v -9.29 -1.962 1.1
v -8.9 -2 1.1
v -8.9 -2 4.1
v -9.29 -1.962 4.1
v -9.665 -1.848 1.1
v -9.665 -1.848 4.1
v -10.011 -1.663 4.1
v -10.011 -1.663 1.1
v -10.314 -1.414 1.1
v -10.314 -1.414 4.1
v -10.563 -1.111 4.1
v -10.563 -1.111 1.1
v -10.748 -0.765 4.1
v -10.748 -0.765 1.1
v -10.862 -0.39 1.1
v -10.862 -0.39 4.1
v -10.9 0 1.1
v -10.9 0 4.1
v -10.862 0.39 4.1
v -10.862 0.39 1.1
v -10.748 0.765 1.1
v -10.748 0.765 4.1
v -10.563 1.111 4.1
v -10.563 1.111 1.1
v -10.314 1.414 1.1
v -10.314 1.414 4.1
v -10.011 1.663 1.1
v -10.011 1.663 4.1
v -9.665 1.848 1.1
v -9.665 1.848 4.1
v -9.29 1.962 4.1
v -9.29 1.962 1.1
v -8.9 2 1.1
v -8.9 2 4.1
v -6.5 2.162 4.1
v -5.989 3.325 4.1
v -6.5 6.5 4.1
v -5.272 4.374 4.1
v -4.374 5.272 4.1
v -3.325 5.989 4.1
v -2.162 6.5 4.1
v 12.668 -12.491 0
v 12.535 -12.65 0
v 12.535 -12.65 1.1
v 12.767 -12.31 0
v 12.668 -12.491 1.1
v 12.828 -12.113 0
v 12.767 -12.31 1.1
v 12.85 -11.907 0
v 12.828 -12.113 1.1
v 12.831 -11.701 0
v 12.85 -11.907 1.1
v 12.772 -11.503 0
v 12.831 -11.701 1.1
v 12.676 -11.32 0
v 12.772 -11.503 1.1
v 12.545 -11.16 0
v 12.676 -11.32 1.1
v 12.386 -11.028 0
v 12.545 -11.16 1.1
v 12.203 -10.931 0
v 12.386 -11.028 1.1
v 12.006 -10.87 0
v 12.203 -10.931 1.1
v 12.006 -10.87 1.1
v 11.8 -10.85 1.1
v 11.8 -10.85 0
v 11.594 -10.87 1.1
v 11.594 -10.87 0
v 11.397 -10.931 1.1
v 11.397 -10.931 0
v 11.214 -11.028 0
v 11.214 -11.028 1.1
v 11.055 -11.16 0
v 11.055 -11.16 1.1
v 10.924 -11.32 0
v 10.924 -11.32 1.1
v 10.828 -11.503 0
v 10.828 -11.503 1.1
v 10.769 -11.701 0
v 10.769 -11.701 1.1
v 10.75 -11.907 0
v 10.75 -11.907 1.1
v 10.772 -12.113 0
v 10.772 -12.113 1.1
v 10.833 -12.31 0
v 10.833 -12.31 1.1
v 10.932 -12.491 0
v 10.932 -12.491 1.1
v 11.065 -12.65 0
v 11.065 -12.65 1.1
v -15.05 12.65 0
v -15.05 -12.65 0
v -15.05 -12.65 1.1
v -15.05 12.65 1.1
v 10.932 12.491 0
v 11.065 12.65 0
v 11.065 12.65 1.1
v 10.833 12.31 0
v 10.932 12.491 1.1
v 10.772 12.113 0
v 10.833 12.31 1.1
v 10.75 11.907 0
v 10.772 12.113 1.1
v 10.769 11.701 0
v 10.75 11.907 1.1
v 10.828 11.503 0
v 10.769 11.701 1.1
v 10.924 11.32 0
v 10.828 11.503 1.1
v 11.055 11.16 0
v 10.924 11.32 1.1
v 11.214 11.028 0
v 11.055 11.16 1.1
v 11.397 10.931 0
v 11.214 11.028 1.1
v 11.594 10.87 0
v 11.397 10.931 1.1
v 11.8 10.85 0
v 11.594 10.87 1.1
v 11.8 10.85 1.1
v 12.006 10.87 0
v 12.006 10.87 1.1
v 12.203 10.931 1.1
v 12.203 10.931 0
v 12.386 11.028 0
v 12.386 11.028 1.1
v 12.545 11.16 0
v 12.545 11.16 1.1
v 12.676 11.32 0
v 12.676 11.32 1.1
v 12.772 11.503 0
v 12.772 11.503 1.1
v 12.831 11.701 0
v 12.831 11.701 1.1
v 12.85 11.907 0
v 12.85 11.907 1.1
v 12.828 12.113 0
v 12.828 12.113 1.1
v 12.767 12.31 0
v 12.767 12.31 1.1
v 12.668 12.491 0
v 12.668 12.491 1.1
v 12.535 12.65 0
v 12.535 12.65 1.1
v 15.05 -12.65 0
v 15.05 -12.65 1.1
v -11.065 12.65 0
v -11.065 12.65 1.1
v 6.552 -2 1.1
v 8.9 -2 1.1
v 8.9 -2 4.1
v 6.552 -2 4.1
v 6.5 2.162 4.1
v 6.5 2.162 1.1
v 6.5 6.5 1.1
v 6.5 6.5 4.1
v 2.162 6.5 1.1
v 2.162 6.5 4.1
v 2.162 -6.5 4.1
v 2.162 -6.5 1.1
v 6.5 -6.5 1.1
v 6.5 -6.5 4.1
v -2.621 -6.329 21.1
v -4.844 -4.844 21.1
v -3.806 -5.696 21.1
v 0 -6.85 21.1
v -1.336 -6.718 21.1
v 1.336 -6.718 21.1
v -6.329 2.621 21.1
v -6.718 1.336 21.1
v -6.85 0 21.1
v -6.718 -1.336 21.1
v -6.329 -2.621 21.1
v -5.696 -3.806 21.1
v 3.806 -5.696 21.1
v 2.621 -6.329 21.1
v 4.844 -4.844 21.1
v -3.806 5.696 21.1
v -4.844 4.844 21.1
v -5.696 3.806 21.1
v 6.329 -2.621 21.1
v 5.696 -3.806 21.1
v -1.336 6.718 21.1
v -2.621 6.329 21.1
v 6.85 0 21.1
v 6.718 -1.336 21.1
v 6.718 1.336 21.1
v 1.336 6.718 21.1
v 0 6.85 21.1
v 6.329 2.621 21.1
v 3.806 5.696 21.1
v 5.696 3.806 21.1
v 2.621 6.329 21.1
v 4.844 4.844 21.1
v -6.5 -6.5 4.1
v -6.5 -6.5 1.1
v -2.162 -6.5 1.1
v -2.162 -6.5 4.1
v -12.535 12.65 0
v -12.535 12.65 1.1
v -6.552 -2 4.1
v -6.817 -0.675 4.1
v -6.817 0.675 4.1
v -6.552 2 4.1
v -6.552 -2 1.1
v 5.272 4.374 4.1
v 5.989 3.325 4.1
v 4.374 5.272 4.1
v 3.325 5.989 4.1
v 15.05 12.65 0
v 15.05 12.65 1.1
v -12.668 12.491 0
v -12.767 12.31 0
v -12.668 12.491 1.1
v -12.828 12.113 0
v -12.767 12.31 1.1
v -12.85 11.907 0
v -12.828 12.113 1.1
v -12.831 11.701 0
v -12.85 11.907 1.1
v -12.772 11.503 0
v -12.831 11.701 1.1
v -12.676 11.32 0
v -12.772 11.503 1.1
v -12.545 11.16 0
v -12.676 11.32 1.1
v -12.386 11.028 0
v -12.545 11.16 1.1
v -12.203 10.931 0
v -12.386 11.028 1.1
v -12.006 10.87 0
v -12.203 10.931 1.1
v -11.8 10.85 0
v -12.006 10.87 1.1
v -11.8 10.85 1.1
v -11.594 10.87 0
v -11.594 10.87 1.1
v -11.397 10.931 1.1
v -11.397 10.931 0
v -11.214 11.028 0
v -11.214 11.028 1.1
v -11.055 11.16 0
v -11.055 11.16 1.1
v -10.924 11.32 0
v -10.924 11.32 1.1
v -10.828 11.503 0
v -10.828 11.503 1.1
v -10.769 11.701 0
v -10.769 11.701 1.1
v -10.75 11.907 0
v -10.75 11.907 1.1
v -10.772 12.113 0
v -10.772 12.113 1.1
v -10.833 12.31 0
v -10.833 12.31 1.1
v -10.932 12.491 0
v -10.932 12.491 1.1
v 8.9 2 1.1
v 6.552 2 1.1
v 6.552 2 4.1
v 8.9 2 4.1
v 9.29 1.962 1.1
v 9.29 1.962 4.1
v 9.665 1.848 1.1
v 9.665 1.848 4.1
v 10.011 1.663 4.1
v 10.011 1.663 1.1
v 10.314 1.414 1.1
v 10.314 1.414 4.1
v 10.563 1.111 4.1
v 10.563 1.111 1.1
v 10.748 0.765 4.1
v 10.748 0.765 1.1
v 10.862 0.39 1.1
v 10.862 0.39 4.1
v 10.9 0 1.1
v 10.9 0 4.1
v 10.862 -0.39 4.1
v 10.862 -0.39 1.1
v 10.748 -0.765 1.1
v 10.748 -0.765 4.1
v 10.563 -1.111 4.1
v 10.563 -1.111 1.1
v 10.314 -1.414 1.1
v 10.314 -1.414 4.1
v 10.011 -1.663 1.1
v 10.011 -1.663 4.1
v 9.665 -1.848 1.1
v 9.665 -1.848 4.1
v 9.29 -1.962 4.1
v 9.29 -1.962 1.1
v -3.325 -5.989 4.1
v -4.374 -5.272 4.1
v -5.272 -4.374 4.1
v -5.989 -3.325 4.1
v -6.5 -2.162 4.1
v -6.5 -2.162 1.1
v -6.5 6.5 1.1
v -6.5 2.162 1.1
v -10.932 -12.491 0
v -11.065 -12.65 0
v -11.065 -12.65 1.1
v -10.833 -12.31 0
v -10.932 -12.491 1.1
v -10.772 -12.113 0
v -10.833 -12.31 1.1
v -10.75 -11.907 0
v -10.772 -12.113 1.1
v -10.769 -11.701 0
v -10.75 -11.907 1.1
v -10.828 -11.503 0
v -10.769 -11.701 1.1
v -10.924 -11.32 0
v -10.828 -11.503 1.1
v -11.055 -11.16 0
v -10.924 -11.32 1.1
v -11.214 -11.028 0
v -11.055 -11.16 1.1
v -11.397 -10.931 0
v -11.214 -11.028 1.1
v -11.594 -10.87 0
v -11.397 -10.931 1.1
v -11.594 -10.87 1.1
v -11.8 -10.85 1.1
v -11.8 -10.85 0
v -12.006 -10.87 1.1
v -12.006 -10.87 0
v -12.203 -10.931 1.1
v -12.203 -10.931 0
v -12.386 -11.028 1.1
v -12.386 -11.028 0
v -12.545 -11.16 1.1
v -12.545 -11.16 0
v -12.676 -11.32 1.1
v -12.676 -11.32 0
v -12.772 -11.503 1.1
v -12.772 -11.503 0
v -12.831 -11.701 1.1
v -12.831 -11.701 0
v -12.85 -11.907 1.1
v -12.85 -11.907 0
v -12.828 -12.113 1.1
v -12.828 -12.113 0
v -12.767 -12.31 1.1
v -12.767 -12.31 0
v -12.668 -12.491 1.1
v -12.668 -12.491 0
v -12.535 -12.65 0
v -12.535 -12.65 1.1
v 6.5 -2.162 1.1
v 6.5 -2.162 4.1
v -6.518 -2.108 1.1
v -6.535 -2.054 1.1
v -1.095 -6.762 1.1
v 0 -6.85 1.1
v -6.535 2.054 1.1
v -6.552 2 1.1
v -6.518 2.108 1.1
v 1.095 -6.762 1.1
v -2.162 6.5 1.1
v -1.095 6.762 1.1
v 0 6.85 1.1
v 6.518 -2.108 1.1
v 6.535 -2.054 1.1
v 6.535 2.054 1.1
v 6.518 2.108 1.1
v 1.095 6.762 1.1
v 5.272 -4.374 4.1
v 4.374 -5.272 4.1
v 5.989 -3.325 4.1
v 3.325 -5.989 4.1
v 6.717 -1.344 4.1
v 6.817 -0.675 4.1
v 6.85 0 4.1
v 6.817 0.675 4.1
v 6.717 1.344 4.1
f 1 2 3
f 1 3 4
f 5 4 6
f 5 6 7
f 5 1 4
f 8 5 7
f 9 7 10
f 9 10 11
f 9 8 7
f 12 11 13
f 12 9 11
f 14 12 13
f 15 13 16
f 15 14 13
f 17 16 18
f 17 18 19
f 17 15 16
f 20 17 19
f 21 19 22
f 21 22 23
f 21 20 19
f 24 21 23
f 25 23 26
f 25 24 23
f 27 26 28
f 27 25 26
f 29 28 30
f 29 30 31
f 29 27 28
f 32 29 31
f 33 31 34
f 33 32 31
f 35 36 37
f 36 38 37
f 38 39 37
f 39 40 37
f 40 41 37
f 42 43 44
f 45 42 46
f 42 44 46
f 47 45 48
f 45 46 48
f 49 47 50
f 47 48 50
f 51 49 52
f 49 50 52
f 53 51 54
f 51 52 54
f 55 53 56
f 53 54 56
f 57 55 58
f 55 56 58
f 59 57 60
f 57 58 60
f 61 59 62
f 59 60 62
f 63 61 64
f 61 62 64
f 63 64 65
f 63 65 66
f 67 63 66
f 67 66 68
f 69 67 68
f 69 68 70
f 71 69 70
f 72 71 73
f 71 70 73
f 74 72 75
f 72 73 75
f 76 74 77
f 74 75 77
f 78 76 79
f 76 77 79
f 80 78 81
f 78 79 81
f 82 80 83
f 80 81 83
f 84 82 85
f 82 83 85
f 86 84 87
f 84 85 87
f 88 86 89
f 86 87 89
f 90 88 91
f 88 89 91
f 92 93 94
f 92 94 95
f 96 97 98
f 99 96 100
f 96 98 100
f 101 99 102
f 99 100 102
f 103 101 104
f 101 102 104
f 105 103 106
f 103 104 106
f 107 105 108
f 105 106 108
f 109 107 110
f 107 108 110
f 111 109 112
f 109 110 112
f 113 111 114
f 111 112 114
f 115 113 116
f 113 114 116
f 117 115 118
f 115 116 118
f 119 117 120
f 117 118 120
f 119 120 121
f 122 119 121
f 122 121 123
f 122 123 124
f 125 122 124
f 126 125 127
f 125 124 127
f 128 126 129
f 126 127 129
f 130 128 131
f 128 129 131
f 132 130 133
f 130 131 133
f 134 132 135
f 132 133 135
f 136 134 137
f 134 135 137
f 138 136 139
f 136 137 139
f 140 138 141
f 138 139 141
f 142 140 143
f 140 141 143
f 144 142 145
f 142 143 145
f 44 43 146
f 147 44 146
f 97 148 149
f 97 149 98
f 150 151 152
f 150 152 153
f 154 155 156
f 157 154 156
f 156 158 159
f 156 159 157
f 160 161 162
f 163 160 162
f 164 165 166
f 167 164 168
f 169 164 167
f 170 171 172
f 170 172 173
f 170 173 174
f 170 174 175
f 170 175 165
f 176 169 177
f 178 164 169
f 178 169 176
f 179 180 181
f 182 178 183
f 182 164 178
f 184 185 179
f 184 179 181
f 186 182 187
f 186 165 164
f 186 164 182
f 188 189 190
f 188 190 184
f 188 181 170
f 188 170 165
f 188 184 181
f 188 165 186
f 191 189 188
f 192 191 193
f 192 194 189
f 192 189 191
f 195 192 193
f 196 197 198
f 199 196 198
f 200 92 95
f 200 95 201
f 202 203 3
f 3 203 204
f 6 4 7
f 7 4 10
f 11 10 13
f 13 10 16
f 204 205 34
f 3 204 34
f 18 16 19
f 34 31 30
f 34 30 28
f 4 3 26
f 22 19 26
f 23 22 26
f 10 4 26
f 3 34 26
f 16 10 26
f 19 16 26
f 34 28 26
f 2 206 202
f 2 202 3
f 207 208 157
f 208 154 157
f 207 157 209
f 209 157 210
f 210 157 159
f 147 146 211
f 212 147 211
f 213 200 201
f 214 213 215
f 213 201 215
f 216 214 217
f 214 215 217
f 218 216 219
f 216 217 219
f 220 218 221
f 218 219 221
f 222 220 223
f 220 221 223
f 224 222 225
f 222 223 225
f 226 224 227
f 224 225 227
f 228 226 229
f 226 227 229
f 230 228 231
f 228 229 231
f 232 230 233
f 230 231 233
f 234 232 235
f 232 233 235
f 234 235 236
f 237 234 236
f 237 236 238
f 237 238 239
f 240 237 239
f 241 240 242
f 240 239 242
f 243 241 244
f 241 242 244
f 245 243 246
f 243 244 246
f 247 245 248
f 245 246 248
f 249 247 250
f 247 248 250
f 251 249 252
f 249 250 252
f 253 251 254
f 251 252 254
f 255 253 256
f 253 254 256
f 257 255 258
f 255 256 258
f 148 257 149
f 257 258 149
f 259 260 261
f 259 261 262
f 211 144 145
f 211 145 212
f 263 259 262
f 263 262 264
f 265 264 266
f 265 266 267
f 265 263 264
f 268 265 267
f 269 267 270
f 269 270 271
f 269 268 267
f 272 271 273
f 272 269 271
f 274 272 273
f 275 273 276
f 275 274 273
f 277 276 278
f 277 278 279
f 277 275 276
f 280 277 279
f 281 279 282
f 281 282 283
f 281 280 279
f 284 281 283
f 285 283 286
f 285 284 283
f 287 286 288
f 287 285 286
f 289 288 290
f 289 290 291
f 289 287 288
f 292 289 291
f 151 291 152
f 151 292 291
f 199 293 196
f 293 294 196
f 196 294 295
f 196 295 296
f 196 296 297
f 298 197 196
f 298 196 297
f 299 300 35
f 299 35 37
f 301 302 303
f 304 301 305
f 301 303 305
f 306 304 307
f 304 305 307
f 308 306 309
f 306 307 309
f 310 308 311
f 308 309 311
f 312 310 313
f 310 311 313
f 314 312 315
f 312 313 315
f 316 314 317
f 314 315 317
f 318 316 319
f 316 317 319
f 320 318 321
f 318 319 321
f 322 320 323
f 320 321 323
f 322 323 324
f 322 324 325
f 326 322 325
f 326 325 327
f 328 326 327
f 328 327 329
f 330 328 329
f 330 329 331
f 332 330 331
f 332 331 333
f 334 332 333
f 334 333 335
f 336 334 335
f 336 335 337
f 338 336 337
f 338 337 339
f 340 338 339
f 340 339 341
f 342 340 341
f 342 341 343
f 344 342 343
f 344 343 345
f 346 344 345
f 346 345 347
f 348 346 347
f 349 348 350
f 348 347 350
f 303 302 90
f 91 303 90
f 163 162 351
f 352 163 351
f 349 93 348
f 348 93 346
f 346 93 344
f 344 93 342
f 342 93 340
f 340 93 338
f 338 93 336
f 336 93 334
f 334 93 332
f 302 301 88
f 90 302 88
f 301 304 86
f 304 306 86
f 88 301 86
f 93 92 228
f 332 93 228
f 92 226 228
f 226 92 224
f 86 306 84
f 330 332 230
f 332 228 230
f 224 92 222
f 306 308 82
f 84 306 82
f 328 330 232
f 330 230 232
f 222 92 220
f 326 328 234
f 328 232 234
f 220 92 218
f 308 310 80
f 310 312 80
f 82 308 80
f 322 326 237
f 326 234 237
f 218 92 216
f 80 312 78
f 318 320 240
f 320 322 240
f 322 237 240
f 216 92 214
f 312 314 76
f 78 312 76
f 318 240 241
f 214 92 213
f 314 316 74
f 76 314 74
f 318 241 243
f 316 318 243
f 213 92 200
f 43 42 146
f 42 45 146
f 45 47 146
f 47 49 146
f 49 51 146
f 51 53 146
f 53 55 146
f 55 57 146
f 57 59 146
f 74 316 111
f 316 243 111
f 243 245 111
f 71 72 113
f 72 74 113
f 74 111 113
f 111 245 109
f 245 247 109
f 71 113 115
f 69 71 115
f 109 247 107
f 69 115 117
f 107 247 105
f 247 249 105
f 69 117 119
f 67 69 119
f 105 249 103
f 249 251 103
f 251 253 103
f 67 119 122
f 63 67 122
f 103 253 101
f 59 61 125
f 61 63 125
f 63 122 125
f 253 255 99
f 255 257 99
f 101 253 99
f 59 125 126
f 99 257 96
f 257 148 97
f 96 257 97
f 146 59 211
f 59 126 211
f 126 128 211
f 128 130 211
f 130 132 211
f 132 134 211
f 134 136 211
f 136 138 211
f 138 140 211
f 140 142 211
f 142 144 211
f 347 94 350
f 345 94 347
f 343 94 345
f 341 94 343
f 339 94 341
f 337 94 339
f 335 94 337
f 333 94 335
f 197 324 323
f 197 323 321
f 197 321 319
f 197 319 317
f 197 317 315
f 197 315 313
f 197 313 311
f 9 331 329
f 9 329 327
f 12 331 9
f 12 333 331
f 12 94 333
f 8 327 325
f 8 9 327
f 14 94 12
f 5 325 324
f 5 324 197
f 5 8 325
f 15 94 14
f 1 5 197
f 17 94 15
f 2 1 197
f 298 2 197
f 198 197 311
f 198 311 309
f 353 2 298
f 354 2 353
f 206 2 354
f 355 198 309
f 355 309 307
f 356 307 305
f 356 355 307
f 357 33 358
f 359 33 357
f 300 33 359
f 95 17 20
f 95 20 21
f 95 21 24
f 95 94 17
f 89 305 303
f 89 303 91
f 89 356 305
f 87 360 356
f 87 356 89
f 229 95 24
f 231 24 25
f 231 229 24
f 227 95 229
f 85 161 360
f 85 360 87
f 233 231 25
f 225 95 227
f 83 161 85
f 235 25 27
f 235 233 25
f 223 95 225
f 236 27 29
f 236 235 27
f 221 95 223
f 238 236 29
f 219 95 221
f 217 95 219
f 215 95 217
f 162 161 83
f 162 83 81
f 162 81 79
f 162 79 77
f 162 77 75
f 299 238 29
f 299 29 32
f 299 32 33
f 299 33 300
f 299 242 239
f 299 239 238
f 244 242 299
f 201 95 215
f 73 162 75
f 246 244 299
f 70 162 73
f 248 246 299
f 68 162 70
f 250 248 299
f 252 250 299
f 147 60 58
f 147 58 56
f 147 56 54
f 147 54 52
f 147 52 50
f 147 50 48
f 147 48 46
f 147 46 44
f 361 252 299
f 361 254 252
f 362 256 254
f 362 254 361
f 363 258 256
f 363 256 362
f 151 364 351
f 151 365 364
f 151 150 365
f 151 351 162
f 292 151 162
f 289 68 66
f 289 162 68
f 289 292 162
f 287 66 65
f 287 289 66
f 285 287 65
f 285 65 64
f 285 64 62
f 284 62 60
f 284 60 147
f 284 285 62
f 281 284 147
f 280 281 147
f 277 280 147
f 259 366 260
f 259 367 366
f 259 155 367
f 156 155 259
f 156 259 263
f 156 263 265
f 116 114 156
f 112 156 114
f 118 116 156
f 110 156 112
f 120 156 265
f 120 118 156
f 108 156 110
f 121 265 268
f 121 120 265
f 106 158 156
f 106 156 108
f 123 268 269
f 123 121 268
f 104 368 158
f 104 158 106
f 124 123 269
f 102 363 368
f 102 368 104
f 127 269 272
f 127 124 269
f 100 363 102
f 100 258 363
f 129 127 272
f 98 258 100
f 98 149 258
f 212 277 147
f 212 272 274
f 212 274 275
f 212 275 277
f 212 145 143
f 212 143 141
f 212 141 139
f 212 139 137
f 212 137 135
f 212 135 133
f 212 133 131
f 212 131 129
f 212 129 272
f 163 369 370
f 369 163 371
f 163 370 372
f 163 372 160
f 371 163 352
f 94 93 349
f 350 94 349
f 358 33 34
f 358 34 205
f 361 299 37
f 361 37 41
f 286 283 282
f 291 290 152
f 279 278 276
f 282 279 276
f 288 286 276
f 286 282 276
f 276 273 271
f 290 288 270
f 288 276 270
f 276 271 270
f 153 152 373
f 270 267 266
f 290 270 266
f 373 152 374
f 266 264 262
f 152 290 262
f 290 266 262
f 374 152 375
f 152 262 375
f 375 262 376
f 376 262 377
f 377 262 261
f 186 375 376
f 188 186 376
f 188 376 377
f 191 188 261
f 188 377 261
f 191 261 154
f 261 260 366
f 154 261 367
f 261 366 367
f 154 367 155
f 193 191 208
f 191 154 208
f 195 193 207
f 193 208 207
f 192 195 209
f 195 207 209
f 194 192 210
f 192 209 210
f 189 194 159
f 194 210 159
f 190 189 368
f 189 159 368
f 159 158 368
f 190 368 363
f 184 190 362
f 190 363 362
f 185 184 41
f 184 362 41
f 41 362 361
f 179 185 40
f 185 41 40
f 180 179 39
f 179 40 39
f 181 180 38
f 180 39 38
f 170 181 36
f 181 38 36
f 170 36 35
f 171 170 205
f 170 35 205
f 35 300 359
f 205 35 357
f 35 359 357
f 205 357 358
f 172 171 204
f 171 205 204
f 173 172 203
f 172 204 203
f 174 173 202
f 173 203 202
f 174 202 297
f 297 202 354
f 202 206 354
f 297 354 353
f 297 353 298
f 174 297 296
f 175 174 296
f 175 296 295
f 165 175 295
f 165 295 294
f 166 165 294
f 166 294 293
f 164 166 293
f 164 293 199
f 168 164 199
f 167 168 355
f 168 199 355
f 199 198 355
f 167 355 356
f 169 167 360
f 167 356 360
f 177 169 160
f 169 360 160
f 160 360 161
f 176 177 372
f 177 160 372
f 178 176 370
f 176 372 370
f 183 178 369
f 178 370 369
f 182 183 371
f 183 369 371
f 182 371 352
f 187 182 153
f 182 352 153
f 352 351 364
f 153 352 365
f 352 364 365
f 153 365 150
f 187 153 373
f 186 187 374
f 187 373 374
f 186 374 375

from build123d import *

# Parameters (mm, degrees)
SKETCH1_W           = 30.1
SKETCH1_H           = 25.3
BOSS_EXTRUDE1_DEPTH = 1.1
SKETCH2_R           = 1.05
CUT_EXTRUDE1_DEPTH  = 2.1
SKETCH3_W           = 13
SKETCH3_H           = 13
BOSS_EXTRUDE2_DEPTH = 3
BOSS_EXTRUDE3_DEPTH = 3
SKETCH5_R           = 6.85
BOSS_EXTRUDE4_DEPTH = 20


with BuildPart() as part:
    # Sketch1 → Boss-Extrude1 (new body)
    with BuildSketch(Plane.XY):
        Rectangle(SKETCH1_W, SKETCH1_H)
    extrude(amount=BOSS_EXTRUDE1_DEPTH)

    # Sketch2 → Cut-Extrude1 (cut, through all)
    with BuildSketch(Plane.XY.offset(1.1)):
        with Locations((-11.8, 11.9)):
            Circle(SKETCH2_R)
        with Locations((11.8, 11.9)):
            Circle(SKETCH2_R)
        with Locations((11.8, -11.9)):
            Circle(SKETCH2_R)
        with Locations((-11.8, -11.9)):
            Circle(SKETCH2_R)
    extrude(amount=-CUT_EXTRUDE1_DEPTH, mode=Mode.SUBTRACT)

    # Sketch3 → Boss-Extrude2 (add)
    with BuildSketch(Plane.XY.offset(1.1)):
        Rectangle(SKETCH3_W, SKETCH3_H)
    extrude(amount=BOSS_EXTRUDE2_DEPTH)

    # Sketch4 → Boss-Extrude3 (add)
    with BuildSketch(Plane.XY.offset(1.1)):
        with BuildLine():
            Line((-8.9, 2), (8.9, 2))
            ThreePointArc((8.9, 2), (10.9, 0), (8.9, -2))
            Line((8.9, -2), (-8.9, -2))
            ThreePointArc((-8.9, -2), (-10.9, 0), (-8.9, 2))
        make_face()
    extrude(amount=BOSS_EXTRUDE3_DEPTH)

    # Sketch5 → Boss-Extrude4 (add)
    with BuildSketch(Plane.XY.offset(1.1)):
        Circle(SKETCH5_R)
    extrude(amount=BOSS_EXTRUDE4_DEPTH)


solid = part.part
